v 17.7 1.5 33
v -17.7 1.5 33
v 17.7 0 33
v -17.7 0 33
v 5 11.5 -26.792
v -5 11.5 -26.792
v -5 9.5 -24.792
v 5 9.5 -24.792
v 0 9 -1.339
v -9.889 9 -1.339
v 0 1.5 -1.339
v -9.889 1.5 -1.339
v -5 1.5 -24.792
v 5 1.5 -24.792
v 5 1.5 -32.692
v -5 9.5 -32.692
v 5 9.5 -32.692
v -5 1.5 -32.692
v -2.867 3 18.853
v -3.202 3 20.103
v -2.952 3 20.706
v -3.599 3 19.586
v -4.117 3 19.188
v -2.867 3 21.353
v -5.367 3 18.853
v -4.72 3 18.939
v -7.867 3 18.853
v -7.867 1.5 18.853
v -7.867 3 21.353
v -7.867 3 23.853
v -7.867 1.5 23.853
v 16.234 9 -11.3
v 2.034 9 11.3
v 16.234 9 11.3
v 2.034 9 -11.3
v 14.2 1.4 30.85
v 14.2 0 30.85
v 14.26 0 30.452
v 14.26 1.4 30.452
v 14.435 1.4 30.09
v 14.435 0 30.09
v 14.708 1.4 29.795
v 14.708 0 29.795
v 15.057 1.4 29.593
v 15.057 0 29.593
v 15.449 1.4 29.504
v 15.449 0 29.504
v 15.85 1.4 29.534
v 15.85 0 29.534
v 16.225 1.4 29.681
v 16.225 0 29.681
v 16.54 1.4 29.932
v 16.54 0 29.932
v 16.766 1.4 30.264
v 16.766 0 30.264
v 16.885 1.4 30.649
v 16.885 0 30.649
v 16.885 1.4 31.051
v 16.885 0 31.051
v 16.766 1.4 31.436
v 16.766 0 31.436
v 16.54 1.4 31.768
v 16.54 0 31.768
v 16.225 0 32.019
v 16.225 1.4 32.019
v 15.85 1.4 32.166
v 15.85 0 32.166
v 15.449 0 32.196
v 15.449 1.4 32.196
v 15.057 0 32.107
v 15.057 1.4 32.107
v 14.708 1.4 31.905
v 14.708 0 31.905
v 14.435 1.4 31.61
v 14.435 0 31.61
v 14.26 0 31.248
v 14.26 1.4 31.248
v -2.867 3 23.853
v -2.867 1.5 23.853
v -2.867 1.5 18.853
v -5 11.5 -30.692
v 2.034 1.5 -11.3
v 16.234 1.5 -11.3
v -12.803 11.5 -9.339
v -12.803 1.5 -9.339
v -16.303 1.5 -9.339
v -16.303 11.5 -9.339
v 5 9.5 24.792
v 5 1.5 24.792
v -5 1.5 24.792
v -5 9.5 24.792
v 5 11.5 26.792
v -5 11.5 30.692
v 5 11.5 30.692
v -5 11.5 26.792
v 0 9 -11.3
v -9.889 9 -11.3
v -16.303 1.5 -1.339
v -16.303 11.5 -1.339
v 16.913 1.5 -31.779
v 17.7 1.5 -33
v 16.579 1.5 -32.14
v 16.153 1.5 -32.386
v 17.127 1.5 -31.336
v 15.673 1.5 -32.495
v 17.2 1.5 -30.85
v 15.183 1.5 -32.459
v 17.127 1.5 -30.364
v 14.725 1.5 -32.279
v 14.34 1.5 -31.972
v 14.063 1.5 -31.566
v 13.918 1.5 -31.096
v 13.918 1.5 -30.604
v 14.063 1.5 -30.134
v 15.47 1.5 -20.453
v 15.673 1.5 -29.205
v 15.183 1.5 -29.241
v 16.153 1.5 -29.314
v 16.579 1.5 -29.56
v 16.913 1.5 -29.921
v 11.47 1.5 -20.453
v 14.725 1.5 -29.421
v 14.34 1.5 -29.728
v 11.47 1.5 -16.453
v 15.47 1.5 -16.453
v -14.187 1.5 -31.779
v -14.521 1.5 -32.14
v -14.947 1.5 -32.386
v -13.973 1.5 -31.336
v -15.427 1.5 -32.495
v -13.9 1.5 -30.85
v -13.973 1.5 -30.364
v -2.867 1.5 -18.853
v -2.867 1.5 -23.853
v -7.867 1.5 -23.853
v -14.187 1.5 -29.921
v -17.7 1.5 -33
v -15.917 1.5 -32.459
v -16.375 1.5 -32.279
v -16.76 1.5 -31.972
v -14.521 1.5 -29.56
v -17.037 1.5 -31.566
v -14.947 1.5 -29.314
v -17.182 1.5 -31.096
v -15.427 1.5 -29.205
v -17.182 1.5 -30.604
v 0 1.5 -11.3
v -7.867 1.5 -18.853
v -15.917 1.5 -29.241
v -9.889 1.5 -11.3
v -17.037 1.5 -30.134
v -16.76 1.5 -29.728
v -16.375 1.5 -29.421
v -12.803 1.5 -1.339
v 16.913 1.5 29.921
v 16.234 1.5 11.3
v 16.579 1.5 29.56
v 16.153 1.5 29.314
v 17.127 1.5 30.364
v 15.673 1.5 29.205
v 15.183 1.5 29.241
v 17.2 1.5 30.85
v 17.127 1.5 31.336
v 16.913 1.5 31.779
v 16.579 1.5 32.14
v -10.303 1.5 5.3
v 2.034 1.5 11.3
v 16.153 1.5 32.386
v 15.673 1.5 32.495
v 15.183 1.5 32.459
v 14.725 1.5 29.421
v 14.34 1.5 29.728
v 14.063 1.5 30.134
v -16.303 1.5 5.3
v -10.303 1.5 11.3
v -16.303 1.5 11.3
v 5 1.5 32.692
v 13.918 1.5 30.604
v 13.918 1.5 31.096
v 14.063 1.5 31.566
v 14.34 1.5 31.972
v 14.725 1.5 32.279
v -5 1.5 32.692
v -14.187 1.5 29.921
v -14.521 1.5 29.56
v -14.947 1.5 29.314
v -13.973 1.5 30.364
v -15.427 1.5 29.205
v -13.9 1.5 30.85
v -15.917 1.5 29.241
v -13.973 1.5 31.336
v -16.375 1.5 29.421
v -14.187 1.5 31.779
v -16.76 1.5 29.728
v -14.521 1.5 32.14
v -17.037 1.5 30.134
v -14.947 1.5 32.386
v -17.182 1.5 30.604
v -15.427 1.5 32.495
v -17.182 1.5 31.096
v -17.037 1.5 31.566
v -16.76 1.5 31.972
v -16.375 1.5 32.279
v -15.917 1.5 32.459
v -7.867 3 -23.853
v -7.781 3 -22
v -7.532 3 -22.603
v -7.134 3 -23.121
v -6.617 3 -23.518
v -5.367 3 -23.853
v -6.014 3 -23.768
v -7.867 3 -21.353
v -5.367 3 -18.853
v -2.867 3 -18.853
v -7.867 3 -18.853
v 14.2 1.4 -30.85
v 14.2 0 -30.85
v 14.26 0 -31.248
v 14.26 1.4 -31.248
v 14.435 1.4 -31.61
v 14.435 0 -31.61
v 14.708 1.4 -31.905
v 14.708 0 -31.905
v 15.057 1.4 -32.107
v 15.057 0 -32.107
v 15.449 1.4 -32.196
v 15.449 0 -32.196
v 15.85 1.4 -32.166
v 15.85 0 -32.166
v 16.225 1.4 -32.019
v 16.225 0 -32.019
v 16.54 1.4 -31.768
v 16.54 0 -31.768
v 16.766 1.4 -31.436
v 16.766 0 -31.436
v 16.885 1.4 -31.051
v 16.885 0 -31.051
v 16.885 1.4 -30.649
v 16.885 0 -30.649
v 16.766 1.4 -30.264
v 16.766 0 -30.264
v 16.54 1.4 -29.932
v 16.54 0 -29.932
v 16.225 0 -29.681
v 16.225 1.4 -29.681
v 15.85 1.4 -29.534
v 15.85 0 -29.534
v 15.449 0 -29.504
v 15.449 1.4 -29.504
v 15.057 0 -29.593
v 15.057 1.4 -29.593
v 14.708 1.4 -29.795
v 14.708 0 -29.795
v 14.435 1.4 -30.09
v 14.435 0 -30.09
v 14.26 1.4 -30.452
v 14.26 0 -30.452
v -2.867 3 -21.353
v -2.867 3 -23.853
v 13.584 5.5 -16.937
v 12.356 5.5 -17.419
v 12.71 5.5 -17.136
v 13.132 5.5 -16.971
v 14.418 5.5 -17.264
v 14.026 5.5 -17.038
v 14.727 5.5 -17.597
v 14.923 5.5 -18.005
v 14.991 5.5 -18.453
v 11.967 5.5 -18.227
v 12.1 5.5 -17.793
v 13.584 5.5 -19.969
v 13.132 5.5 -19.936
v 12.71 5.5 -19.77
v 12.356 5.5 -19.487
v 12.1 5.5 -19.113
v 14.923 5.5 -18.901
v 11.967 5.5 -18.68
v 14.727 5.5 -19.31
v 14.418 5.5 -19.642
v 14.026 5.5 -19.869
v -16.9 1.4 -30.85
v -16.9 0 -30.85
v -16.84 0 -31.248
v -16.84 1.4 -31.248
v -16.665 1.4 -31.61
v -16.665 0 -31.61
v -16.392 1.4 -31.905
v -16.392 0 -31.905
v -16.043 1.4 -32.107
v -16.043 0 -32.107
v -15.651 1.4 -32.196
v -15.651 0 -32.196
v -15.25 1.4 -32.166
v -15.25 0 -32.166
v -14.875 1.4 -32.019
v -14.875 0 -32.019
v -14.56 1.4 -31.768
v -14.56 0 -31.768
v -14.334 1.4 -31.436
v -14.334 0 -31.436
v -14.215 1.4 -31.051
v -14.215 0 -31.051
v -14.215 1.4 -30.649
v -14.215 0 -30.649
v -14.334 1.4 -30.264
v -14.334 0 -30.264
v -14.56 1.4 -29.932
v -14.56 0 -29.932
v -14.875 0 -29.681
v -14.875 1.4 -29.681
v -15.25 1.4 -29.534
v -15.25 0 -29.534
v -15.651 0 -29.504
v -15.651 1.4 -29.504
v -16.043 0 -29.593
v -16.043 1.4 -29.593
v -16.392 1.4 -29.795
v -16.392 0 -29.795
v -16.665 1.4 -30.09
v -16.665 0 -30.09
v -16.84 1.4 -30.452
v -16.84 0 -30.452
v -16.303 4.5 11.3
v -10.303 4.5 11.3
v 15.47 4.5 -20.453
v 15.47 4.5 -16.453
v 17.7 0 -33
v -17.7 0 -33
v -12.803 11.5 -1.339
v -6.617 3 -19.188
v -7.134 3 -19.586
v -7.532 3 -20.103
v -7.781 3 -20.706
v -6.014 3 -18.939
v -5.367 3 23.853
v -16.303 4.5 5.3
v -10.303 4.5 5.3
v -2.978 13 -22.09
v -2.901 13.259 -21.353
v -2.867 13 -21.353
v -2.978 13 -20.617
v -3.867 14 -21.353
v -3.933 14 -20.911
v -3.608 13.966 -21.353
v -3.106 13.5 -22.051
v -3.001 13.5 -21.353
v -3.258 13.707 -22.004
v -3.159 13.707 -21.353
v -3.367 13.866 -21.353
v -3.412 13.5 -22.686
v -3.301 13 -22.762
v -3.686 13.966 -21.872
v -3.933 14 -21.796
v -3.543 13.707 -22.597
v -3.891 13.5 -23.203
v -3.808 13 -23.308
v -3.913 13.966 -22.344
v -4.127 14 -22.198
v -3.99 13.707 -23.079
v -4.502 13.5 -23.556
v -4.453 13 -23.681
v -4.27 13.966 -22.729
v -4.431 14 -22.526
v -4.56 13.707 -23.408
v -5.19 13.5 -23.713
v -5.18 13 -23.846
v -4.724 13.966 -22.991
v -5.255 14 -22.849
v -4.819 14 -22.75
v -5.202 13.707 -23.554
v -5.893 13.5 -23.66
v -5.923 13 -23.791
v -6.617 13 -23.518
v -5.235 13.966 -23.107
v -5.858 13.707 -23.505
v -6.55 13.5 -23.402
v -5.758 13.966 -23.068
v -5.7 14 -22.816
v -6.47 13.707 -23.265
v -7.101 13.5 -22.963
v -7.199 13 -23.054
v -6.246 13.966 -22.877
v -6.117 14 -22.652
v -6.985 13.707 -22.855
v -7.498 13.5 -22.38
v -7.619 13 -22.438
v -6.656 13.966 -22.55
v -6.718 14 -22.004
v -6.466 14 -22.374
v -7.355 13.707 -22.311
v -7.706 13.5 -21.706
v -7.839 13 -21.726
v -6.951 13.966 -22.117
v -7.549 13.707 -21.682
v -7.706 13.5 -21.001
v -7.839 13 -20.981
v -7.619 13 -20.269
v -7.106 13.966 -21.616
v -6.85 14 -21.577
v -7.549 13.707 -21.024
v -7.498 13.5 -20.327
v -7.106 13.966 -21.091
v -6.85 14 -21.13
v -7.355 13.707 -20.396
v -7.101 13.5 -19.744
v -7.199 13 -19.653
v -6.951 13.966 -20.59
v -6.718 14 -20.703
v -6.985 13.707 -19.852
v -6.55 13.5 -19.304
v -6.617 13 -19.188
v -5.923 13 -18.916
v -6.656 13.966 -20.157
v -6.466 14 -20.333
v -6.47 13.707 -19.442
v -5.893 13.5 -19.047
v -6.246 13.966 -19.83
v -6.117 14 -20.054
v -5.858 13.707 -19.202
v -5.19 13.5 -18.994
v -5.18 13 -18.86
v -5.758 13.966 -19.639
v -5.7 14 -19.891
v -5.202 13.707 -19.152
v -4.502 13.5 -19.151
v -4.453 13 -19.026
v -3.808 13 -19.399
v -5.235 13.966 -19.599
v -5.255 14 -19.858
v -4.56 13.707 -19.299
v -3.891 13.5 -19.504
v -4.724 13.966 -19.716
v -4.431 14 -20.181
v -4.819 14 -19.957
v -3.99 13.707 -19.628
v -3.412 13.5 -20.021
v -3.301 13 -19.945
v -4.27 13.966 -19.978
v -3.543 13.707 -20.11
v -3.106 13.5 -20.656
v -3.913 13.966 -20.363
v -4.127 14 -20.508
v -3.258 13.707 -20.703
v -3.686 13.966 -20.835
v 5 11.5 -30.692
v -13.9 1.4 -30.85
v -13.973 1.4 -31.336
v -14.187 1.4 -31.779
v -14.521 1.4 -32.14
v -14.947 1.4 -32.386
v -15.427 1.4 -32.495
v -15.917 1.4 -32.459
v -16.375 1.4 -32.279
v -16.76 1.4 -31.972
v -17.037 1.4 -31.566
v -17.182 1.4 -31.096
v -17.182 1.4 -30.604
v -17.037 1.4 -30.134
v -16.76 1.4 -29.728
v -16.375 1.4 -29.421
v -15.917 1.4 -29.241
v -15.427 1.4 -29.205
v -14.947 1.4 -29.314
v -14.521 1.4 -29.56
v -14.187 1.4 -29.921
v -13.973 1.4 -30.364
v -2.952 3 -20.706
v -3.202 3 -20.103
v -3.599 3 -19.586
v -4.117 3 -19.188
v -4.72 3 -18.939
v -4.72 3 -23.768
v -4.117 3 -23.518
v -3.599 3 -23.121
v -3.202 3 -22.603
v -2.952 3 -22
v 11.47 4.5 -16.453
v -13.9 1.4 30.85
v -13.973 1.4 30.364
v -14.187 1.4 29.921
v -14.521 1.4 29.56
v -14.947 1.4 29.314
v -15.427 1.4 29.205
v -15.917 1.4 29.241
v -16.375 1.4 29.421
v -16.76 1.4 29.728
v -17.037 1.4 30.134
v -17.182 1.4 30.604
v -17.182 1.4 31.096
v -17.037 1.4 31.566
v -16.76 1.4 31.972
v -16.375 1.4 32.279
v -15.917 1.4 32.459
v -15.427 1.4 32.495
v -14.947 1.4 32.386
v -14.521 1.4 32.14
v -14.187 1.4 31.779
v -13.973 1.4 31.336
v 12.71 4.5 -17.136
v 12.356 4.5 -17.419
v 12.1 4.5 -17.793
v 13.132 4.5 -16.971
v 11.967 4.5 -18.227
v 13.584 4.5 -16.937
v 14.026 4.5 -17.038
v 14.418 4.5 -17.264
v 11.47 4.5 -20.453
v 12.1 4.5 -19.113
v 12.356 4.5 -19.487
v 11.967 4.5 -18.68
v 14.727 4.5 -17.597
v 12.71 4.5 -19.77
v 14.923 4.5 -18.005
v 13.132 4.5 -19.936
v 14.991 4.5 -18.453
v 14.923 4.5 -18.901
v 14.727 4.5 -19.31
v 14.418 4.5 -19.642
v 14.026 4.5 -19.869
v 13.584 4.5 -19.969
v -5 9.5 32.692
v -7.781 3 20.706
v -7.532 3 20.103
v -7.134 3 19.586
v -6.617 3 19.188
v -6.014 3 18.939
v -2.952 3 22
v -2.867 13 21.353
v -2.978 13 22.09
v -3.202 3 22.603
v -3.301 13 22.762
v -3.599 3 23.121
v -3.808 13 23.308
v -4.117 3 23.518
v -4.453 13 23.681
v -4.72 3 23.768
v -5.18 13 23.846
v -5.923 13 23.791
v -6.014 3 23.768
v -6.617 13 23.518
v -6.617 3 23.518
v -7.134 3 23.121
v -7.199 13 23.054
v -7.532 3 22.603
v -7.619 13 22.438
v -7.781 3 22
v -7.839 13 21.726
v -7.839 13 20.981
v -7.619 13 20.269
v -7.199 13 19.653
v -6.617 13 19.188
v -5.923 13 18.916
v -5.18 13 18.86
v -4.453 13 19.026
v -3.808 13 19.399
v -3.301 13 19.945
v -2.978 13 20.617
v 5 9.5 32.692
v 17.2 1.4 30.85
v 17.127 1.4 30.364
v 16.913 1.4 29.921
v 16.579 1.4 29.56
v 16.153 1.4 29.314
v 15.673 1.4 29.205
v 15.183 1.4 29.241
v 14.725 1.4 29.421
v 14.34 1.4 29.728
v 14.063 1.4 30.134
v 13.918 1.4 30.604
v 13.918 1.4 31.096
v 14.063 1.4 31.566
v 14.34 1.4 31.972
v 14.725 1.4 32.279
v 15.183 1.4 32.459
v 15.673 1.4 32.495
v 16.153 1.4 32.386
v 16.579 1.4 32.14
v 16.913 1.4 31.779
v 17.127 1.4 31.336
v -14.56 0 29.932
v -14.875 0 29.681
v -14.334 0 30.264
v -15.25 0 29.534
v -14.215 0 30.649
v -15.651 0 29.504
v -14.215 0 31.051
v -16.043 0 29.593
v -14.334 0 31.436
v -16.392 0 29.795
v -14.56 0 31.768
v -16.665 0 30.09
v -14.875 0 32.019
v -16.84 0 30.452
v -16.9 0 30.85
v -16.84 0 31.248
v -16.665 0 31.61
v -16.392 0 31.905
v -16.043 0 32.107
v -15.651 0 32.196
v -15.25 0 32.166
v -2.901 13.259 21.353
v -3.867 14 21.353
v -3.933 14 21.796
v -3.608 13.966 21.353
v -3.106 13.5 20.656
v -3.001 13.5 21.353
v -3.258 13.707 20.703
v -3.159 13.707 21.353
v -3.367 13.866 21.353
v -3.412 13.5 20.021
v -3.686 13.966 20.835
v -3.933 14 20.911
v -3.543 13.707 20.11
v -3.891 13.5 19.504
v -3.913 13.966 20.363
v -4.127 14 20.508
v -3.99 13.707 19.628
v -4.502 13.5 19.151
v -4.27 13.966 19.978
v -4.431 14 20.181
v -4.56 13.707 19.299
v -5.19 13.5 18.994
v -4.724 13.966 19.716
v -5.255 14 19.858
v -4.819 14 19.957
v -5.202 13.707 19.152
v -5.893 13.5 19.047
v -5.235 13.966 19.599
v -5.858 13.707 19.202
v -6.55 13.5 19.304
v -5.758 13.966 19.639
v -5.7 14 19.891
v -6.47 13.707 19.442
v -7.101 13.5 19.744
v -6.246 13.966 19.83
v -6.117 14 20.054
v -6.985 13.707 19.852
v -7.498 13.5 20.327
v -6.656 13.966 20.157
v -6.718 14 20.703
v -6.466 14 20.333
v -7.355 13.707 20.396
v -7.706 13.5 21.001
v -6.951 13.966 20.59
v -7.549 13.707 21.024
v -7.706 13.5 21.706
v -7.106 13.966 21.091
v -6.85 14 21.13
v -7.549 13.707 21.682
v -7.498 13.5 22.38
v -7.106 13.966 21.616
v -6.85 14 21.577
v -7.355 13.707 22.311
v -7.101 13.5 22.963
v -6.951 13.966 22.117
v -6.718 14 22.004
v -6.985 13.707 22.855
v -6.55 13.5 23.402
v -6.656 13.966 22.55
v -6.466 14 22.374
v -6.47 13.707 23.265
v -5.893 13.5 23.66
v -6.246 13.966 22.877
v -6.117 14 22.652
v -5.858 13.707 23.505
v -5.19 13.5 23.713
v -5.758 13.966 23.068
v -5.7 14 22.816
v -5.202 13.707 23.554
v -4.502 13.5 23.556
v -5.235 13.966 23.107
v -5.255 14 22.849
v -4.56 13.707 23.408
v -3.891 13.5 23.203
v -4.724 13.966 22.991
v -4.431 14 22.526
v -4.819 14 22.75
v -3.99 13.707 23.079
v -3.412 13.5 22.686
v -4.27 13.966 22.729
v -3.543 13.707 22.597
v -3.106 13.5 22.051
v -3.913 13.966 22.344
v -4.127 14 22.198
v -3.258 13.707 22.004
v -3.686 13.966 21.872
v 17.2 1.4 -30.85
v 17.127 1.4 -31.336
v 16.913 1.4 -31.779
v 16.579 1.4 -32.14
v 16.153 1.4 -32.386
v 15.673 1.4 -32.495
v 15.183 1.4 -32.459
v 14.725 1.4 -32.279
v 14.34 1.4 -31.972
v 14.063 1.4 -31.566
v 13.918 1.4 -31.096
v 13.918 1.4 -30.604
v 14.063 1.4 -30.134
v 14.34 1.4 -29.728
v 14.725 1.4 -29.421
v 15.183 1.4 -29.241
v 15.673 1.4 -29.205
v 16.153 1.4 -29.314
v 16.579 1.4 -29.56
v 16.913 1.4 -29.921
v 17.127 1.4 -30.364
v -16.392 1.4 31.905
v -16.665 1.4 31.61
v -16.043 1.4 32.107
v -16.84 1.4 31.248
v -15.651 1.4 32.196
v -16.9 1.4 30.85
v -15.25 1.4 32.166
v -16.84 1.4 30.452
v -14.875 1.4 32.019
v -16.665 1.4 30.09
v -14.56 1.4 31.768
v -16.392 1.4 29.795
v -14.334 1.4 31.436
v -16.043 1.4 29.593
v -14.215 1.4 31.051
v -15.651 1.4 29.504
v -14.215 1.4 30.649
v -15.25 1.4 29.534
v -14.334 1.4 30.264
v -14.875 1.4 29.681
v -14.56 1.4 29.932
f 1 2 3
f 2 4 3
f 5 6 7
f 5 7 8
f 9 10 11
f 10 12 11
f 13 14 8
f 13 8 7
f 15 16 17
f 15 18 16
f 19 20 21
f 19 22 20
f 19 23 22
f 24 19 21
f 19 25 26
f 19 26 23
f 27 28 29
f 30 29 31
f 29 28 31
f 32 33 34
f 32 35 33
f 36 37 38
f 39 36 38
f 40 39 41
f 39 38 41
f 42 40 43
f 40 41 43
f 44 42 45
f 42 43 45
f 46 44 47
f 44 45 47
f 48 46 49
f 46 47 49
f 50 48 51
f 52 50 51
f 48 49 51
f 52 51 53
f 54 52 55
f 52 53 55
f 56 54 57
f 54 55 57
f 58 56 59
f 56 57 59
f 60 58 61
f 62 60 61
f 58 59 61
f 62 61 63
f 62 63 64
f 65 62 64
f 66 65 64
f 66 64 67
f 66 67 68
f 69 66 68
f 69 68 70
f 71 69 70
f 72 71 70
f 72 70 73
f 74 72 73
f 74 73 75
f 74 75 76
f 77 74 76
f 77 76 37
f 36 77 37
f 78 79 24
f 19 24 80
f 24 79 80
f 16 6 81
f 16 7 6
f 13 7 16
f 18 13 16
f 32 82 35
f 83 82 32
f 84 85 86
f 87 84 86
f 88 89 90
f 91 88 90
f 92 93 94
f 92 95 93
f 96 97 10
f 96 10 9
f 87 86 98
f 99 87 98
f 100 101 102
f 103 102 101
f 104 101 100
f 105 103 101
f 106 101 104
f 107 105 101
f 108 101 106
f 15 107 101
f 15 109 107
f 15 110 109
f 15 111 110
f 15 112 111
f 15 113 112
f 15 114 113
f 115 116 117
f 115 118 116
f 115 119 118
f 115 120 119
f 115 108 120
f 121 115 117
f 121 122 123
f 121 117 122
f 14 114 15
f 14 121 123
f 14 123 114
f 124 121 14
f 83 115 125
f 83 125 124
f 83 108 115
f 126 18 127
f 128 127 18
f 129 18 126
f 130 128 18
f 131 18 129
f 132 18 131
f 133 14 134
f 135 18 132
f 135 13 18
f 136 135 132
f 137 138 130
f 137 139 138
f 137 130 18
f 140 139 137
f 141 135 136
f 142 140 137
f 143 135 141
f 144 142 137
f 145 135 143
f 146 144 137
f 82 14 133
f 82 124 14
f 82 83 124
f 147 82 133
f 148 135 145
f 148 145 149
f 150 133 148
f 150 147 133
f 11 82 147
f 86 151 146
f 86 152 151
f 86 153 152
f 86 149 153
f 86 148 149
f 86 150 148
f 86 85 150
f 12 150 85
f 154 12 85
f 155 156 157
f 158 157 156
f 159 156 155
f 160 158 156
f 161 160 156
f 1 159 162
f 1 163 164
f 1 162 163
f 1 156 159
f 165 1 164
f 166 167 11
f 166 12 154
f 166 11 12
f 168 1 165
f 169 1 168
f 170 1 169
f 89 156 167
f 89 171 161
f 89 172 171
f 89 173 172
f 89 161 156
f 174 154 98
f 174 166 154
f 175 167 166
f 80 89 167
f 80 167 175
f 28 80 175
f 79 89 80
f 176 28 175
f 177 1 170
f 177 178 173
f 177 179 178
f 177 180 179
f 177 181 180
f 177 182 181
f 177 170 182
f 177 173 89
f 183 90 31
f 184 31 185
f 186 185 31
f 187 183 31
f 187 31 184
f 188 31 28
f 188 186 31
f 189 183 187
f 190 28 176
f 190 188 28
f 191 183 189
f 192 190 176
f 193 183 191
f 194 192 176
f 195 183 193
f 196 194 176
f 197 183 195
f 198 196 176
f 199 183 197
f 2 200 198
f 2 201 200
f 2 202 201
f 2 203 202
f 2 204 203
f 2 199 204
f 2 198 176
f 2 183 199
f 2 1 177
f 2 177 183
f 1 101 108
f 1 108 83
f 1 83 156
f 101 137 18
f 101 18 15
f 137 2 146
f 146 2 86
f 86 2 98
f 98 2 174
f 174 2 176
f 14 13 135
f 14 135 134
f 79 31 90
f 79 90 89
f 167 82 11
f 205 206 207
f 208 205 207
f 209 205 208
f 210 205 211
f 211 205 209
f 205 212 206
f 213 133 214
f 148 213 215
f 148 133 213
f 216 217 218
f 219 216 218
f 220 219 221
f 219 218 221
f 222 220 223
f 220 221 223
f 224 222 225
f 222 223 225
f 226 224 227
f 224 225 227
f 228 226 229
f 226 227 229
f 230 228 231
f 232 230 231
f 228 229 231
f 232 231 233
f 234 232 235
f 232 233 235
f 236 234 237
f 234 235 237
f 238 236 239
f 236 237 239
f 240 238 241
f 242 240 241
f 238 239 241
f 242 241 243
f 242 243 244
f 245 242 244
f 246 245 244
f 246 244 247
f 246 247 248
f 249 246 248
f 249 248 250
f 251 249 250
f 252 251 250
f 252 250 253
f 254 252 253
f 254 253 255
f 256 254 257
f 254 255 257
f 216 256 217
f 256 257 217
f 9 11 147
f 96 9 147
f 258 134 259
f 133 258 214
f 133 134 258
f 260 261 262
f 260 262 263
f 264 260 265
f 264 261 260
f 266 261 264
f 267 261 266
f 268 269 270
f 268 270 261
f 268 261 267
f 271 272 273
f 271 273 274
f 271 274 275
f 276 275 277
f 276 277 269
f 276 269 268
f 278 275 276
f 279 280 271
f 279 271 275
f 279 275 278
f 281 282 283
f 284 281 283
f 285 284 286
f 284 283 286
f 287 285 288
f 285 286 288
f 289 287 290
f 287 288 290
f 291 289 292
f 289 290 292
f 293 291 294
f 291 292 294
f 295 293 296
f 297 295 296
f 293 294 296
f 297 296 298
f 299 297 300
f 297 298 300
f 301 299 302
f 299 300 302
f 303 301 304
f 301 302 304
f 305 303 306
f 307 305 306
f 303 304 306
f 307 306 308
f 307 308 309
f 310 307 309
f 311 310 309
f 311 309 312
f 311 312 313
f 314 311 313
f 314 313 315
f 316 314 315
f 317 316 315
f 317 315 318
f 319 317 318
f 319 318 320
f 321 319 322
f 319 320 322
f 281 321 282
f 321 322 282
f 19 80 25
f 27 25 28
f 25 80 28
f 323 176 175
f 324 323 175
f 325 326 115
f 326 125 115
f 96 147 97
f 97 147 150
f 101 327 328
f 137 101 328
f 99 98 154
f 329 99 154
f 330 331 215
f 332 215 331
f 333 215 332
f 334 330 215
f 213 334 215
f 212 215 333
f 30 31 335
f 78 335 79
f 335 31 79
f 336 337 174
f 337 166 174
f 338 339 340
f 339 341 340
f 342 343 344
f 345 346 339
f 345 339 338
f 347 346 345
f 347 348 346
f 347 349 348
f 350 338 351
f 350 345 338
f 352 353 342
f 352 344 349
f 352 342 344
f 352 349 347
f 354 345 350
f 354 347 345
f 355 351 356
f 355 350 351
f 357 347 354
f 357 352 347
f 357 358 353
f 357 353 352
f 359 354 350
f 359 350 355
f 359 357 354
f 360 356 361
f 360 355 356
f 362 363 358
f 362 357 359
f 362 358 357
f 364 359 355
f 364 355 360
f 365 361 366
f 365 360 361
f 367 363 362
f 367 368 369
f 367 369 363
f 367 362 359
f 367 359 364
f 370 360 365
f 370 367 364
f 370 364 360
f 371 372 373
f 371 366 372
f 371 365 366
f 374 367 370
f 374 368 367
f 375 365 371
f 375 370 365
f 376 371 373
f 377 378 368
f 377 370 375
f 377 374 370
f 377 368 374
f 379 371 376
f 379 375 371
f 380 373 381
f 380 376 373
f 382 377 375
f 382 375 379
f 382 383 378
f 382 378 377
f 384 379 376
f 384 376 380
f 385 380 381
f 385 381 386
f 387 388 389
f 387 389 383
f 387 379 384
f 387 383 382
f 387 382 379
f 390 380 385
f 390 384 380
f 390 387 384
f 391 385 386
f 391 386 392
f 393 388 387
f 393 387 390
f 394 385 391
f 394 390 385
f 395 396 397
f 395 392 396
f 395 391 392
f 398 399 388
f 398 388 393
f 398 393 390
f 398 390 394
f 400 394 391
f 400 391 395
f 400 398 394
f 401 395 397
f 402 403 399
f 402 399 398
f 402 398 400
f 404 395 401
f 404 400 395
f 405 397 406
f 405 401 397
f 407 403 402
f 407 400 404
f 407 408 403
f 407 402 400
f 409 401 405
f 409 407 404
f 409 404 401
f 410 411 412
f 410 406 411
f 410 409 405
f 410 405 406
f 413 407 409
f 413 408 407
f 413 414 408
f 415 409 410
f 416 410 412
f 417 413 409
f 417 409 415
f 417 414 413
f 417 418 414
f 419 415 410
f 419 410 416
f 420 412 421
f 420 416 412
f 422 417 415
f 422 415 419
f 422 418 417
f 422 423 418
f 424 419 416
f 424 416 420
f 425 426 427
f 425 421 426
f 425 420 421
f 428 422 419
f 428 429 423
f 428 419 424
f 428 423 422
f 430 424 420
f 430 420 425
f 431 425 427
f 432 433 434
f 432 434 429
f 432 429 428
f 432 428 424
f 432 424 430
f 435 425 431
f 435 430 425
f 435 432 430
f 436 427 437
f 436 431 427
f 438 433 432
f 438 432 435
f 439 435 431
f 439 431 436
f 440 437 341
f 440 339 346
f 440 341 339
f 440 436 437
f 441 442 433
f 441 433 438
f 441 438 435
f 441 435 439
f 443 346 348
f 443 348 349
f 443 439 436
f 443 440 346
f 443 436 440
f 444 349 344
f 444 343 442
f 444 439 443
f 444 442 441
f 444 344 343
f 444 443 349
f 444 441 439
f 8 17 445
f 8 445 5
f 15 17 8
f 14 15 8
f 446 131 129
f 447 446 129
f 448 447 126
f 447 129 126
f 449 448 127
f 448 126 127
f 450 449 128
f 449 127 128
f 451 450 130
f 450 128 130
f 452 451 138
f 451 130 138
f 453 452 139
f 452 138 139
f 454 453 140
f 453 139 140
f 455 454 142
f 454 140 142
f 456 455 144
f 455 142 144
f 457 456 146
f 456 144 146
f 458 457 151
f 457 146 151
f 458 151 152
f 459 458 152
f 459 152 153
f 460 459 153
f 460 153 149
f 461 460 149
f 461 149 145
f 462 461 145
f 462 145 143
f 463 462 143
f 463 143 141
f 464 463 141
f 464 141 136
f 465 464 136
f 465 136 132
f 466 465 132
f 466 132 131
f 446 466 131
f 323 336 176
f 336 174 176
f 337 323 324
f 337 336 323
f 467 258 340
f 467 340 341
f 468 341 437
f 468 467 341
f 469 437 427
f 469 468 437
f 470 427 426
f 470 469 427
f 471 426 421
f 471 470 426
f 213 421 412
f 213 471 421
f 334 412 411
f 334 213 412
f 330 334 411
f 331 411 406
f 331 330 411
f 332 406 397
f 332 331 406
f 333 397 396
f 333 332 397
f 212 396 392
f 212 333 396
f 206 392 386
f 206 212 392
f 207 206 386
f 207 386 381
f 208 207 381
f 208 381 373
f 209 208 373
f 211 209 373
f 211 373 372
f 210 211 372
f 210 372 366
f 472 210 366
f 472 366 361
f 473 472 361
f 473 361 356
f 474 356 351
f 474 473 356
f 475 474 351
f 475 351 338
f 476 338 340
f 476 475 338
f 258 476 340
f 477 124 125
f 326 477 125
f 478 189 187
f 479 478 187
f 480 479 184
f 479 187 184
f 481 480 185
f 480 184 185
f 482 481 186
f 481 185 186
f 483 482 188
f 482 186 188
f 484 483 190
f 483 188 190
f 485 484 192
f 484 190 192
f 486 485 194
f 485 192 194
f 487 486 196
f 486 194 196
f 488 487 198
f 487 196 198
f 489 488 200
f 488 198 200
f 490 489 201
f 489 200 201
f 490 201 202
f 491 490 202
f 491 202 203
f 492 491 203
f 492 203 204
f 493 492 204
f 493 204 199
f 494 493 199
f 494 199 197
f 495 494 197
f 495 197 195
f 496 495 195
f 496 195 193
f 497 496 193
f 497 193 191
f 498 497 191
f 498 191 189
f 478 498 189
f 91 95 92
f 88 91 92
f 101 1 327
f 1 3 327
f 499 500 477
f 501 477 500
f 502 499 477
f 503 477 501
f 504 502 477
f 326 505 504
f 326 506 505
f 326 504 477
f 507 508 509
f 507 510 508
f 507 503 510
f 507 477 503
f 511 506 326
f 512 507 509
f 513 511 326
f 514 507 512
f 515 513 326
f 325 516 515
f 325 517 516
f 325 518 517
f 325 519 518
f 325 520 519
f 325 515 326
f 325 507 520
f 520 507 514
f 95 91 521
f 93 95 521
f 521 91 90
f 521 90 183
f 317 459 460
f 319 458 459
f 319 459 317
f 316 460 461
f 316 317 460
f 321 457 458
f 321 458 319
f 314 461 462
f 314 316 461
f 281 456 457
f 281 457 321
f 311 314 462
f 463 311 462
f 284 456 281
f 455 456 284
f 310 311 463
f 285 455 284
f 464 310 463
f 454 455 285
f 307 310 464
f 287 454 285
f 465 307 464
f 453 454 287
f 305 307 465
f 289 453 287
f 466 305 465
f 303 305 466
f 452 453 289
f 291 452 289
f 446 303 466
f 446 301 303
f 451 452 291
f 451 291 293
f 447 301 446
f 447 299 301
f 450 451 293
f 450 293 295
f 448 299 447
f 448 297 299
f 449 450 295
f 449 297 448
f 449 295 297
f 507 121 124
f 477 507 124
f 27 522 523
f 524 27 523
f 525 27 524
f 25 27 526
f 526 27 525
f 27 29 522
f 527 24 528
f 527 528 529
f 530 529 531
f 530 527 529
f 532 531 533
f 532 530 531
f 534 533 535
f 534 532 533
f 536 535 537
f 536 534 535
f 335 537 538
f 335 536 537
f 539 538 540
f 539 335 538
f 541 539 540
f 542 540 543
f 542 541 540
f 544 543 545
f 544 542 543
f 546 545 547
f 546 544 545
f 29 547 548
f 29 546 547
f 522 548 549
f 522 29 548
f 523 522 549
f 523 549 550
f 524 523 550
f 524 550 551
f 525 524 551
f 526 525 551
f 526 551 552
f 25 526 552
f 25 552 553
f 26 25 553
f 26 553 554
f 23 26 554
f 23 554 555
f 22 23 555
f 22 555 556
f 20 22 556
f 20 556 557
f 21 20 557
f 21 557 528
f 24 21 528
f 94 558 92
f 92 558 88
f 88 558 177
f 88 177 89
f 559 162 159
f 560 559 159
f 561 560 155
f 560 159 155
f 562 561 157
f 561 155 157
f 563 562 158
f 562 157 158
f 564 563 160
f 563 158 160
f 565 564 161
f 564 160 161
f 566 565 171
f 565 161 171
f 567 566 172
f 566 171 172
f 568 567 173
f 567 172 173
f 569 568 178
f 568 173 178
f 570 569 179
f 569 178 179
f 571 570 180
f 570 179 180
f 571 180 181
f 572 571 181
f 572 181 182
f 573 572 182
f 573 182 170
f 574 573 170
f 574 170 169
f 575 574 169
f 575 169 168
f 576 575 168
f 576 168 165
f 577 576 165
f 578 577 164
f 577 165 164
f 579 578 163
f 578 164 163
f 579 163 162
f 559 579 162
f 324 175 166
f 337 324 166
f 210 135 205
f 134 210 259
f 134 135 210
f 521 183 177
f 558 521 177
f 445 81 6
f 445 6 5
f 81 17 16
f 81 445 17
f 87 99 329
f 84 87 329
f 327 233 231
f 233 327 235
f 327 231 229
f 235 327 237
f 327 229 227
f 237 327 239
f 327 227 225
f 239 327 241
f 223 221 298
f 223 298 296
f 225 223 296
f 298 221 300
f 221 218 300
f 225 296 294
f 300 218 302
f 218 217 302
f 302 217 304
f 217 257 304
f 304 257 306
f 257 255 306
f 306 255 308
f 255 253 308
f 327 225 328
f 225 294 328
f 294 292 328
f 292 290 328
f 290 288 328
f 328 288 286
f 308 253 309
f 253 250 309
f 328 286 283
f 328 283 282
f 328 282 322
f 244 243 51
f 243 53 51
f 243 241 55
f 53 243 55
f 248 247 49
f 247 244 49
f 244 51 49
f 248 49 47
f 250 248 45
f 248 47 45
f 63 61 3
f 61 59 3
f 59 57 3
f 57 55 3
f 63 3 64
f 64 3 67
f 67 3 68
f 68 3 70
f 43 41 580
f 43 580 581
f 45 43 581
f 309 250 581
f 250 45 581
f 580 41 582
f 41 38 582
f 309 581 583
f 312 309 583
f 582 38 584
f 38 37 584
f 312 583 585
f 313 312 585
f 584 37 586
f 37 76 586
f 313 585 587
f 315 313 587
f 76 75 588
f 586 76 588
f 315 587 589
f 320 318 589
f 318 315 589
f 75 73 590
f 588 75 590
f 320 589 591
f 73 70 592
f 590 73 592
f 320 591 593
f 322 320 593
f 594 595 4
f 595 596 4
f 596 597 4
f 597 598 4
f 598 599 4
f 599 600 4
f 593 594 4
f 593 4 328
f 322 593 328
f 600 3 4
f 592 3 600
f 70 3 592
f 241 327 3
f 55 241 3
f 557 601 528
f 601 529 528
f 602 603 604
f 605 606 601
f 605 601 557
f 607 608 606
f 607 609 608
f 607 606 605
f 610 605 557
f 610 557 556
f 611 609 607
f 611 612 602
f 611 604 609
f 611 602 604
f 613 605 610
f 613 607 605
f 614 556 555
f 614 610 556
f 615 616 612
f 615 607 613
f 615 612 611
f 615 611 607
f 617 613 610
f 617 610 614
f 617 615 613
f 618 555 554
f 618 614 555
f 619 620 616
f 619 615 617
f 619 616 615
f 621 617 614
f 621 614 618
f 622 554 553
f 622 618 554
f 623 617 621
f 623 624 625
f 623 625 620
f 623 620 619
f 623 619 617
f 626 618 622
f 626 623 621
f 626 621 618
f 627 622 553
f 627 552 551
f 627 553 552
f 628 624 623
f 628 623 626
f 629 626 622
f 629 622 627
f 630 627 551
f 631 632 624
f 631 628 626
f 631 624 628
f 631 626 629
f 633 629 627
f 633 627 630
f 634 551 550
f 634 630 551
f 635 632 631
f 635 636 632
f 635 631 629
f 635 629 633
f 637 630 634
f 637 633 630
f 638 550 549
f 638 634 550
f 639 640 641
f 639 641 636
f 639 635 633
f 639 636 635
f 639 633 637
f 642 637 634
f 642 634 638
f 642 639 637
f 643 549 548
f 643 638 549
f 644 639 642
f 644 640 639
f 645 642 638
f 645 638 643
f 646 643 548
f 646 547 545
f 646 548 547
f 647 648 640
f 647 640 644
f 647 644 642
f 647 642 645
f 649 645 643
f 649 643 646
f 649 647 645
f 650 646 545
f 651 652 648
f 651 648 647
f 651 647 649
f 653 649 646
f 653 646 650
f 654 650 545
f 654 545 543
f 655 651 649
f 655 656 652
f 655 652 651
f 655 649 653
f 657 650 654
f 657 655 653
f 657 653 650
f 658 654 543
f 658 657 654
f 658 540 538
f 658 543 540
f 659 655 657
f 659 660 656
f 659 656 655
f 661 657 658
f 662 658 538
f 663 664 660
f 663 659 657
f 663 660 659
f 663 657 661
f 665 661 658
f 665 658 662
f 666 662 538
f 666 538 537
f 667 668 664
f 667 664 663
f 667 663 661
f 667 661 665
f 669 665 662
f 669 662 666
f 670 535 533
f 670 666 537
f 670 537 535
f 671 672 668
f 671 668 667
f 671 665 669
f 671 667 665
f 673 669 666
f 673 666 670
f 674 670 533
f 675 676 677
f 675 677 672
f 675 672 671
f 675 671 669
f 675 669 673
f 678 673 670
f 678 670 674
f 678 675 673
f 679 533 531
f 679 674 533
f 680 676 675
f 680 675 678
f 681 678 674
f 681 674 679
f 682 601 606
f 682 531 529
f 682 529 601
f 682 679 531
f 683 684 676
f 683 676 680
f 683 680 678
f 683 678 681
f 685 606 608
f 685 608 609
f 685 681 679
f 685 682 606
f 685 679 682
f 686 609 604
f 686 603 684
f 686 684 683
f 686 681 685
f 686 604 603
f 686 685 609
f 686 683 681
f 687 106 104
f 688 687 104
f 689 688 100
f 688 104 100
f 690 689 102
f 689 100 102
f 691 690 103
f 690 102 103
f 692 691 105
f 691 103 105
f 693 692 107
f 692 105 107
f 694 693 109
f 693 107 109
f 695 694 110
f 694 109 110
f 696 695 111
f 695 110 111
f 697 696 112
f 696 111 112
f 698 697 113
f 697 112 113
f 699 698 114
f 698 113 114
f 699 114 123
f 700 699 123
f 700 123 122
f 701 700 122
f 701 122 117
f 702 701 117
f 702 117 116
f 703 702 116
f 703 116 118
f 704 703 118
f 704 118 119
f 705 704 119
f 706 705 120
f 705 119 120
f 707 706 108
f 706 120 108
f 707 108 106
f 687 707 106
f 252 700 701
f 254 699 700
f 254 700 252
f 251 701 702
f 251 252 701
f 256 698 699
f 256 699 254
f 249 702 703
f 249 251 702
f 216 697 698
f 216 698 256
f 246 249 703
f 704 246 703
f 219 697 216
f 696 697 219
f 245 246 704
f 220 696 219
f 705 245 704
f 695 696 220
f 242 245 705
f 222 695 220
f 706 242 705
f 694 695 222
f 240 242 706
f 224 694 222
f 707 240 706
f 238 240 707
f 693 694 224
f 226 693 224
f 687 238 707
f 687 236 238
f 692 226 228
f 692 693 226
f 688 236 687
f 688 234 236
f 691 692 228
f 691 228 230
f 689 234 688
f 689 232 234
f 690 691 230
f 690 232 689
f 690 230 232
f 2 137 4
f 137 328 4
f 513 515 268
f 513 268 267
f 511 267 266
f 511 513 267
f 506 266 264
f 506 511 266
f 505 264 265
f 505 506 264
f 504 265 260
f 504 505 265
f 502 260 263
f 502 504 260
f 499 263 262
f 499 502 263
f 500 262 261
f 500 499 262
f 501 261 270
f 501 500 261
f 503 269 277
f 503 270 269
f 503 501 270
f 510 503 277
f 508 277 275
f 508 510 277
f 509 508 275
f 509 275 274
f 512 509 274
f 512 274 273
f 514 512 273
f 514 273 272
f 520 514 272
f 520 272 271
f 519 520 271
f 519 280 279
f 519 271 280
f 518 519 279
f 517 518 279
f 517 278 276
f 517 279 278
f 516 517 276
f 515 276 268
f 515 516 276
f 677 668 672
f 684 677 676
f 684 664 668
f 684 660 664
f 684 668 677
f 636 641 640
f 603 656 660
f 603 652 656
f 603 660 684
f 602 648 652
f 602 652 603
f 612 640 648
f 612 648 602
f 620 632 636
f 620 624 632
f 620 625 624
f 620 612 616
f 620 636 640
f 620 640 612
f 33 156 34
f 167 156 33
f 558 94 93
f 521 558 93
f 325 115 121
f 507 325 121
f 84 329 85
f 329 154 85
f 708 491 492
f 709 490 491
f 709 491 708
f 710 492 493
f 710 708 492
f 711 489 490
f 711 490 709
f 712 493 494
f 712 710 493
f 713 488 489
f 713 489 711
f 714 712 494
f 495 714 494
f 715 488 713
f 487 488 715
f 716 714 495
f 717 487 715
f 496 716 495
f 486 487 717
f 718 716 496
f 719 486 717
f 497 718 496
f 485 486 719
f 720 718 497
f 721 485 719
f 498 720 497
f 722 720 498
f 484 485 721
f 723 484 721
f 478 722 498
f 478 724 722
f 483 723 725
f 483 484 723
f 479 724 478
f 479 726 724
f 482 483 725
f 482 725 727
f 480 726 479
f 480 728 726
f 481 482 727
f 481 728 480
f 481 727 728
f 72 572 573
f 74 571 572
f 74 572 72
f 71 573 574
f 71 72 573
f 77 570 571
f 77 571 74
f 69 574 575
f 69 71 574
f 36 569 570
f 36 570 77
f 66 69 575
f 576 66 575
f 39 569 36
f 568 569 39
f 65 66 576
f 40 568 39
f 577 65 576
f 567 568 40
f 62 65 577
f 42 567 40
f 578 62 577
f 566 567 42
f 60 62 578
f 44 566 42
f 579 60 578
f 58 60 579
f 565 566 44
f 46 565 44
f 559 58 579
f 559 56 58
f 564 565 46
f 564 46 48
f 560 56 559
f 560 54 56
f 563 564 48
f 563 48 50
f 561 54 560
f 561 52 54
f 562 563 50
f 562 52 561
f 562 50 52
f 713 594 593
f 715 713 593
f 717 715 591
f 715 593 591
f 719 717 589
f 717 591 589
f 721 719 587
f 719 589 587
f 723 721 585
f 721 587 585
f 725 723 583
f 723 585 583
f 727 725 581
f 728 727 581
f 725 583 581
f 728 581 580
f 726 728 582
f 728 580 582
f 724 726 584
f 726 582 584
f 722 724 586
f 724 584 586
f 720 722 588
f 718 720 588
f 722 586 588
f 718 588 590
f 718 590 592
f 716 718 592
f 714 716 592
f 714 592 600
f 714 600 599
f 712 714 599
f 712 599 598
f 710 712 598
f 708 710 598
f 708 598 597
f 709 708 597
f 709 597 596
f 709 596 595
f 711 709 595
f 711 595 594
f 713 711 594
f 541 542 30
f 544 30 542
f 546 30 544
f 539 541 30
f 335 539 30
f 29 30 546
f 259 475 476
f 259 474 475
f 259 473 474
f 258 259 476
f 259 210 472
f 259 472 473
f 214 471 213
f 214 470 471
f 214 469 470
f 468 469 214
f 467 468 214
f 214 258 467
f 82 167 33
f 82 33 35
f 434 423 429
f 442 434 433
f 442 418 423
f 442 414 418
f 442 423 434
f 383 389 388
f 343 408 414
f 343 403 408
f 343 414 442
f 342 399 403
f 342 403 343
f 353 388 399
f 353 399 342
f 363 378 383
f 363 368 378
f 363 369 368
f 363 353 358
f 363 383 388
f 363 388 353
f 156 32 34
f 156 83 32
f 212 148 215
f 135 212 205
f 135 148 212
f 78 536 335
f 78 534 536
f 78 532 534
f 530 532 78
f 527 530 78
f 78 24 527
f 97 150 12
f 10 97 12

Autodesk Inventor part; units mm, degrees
ref_plane "YZ Plane" through (0, 0, 0) normal (1, 0, 0) x (0, 1, 0)
ref_plane "XZ Plane" through (0, 0, 0) normal (0, 1, 0) x (-1, 0, 0)
ref_plane "XY Plane" through (0, 0, 0) normal (0, 0, 1) x (1, 0, 0)
sketch "Esboço1" plane through (0, 0, 0) normal (0, 1, 0) x (-1, 0, 0)
  line L0 (-17.7, -33) -> (17.7, -33)
  line L1 (17.7, -33) -> (17.7, 33)
  line L2 (17.7, 33) -> (-17.7, 33)
  line L3 (-17.7, 33) -> (-17.7, -33)
  line L4 (-17.7, -33) -> (17.7, 33) construction
  line L5 (17.7, -33) -> (-17.7, 33) construction
  circle A0 centre (15.55, 30.85) radius 1.35
  circle A1 centre (-15.55, 30.85) radius 1.35
  circle A2 centre (15.55, -30.85) radius 1.35
  circle A3 centre (-15.55, -30.85) radius 1.35
  point P0 (0, 0)
  dimension "d0" = 35.4
  dimension "d1" = 66
  dimension "d2" = 2.7
  dimension "d4" = 0.8
  dimension "d5" = 0.8
  dimension "d6" = 2.7
  dimension "d8" = 0.8
  dimension "d9" = 0.8
extrude "Extrusão1" add sketch "Esboço1" along normal blind 1.5
sketch "Esboço2" plane through (0, 1.5, 0) normal (0, 1, 0) x (1, 0, 0)
  line L0 (5, 24.7918) -> (-5, 24.7918)
  line L1 (-5, 24.7918) -> (-5, 32.6918)
  line L2 (-5, 32.6918) -> (5, 32.6918)
  line L3 (5, 32.6918) -> (5, 24.7918)
  line L4 (5, 24.7918) -> (-5, 32.6918) construction
  line L5 (-5, 24.7918) -> (5, 32.6918) construction
  line L6 (-26.0305, 0) -> (25.0606, 0)
  line L7 (5, -24.7918) -> (-5, -24.7918)
  line L8 (-5, -24.7918) -> (-5, -32.6918)
  line L9 (-5, -32.6918) -> (5, -32.6918)
  line L10 (5, -32.6918) -> (5, -24.7918)
  line L11 (16.2337, -11.3) -> (2.0337, -11.3)
  line L12 (2.0337, -11.3) -> (2.0337, 11.3)
  line L13 (2.0337, 11.3) -> (16.2337, 11.3)
  line L14 (16.2337, 11.3) -> (16.2337, -11.3)
  line L15 (16.2337, -11.3) -> (2.0337, 11.3) construction
  line L16 (2.0337, -11.3) -> (16.2337, 11.3) construction
  line L17 (-7.8666, -23.8534) -> (-2.8666, -23.8534)
  line L18 (-2.8666, -23.8534) -> (-2.8666, -18.8534)
  line L19 (-2.8666, -18.8534) -> (-7.8666, -18.8534)
  line L20 (-7.8666, -18.8534) -> (-7.8666, -23.8534)
  line L21 (-7.8666, 23.8534) -> (-2.8666, 23.8534)
  line L22 (-2.8666, 23.8534) -> (-2.8666, 18.8534)
  line L23 (-2.8666, 18.8534) -> (-7.8666, 18.8534)
  line L24 (-7.8666, 18.8534) -> (-7.8666, 23.8534)
  line L25 (11.4703, 16.4532) -> (15.4703, 16.4532)
  line L26 (15.4703, 16.4532) -> (15.4703, 20.4532)
  line L27 (15.4703, 20.4532) -> (11.4703, 20.4532)
  line L28 (11.4703, 20.4532) -> (11.4703, 16.4532)
  line L29 (-16.3029, 1.3386) -> (-12.8029, 1.3386)
  line L30 (-12.8029, 1.3386) -> (-12.8029, 9.3386)
  line L31 (-12.8029, 9.3386) -> (-16.3029, 9.3386)
  line L32 (-16.3029, 9.3386) -> (-16.3029, 1.3386)
  line L33 (-9.8893, 1.3386) -> (0, 1.3386)
  line L34 (0, 1.3386) -> (0, 11.3)
  line L35 (0, 11.3) -> (-9.8893, 11.3)
  line L36 (-9.8893, 11.3) -> (-9.8893, 1.3386)
  line L37 (-16.3029, -11.3) -> (-10.3029, -11.3)
  line L38 (-10.3029, -11.3) -> (-10.3029, -5.3)
  line L39 (-10.3029, -5.3) -> (-16.3029, -5.3)
  line L40 (-16.3029, -5.3) -> (-16.3029, -11.3)
  circle A0 centre (-15.55, -30.85) radius 1.35 projected
  circle A1 centre (-15.55, -30.85) radius 1.65
  circle A2 centre (15.55, -30.85) radius 1.35 projected
  circle A3 centre (15.55, -30.85) radius 1.65
  circle A4 centre (-15.55, 30.85) radius 1.65
  circle A5 centre (15.55, 30.85) radius 1.65
  point P0 (0, 0)
  point P1 (0, 28.7418)
  point P2 (0, -28.7418)
  point P3 (9.1337, 0)
  dimension "d12" = 10
  dimension "d13" = 7.9
  dimension "d14" = 14.2
  dimension "d15" = 22.6
  dimension "d16" = 5
  dimension "d17" = 5
  dimension "d18" = 4
  dimension "d19" = 4
  dimension "d20" = 3.5
  dimension "d21" = 8
  dimension "d22" = 6
  dimension "d23" = 6
  dimension "d42" = 3.3
  dimension "d43" = 3.3
extrude "Extrusão2" add sketch "Esboço2" along normal blind 10 contours L0 L1 L2 L3 | L10 L9 L8 L7 | L32 L31 L30 L29
chamfer "Chanfro1" distance 2 angle 45 4 edges at (0, 11.5, -24.7918) (0, 11.5, -32.6918) (0, 11.5, 32.6918) (0, 11.5, 24.7918)
extrude "Extrusão3" add sketch "Esboço2" along normal blind 7.5 contours L12 L13 L14 L6 | L6 L14 L11 L12 | L36 L35 L34 L33
extrude "Extrusão4" add sketch "Esboço2" along normal blind 3 contours L28 L27 L26 L25 | L40 L39 L38 L37
extrude "Extrusão5" add sketch "Esboço2" along normal blind 1.5 contours L20 L19 L18 L17 | L21 L22 L23 L24
sketch "Esboço3" plane through (0, 3, 0) normal (0, 1, 0) x (1, 0, 0)
  line L0 (-7.8666, -18.8534) -> (-7.8666, -23.8534) projected
  line L1 (-7.8666, -23.8534) -> (-2.8666, -23.8534) projected
  line L2 (-2.8666, -18.8534) -> (-7.8666, -18.8534) projected
  line L3 (-2.8666, -23.8534) -> (-2.8666, -18.8534) projected
  circle A0 centre (-5.3666, -21.3534) radius 2.5
  point P0 (0, 0)
sketch "Esboço4" plane through (0, 3, 0) normal (0, 1, 0) x (1, 0, 0)
  line L0 (-7.8666, 23.8534) -> (-7.8666, 18.8534) projected
  line L1 (-7.8666, 18.8534) -> (-2.8666, 18.8534) projected
  line L2 (-2.8666, 23.8534) -> (-7.8666, 23.8534) projected
  line L3 (-2.8666, 18.8534) -> (-2.8666, 23.8534) projected
  circle A0 centre (-5.3666, 21.3534) radius 2.5
  point P0 (0, 0)
sketch "Esboço7" plane through (0, 4.5, 0) normal (0, 1, 0) x (1, 0, 0)
  line L0 (11.4703, 20.4532) -> (11.4703, 16.4532) projected
  line L1 (11.4703, 16.4532) -> (15.4703, 16.4532) projected
  line L2 (15.4703, 20.4532) -> (11.4703, 20.4532) projected
  line L3 (15.4703, 16.4532) -> (15.4703, 20.4532) projected
  circle A0 centre (13.4703, 18.4532) radius 1.5205
  point P0 (0, 0)
extrude "Extrusão6" add sketch "Esboço3" along normal blind 11 contours A0
extrude "Extrusão7" add sketch "Esboço4" along normal blind 11 contours A0
extrude "Extrusão8" add sketch "Esboço7" along normal blind 1 contours A0
fillet "Arredondamento1" radius 1 2 edges at (-7.8666, 14, 21.3534) (-7.8666, 14, -21.3534)
extrude "Extrusão9" cut sketch "Esboço2" against normal blind 0.1 contours A1 | A3 | A4 | A5
properties part number "STEP_DOWN_LM2596"
